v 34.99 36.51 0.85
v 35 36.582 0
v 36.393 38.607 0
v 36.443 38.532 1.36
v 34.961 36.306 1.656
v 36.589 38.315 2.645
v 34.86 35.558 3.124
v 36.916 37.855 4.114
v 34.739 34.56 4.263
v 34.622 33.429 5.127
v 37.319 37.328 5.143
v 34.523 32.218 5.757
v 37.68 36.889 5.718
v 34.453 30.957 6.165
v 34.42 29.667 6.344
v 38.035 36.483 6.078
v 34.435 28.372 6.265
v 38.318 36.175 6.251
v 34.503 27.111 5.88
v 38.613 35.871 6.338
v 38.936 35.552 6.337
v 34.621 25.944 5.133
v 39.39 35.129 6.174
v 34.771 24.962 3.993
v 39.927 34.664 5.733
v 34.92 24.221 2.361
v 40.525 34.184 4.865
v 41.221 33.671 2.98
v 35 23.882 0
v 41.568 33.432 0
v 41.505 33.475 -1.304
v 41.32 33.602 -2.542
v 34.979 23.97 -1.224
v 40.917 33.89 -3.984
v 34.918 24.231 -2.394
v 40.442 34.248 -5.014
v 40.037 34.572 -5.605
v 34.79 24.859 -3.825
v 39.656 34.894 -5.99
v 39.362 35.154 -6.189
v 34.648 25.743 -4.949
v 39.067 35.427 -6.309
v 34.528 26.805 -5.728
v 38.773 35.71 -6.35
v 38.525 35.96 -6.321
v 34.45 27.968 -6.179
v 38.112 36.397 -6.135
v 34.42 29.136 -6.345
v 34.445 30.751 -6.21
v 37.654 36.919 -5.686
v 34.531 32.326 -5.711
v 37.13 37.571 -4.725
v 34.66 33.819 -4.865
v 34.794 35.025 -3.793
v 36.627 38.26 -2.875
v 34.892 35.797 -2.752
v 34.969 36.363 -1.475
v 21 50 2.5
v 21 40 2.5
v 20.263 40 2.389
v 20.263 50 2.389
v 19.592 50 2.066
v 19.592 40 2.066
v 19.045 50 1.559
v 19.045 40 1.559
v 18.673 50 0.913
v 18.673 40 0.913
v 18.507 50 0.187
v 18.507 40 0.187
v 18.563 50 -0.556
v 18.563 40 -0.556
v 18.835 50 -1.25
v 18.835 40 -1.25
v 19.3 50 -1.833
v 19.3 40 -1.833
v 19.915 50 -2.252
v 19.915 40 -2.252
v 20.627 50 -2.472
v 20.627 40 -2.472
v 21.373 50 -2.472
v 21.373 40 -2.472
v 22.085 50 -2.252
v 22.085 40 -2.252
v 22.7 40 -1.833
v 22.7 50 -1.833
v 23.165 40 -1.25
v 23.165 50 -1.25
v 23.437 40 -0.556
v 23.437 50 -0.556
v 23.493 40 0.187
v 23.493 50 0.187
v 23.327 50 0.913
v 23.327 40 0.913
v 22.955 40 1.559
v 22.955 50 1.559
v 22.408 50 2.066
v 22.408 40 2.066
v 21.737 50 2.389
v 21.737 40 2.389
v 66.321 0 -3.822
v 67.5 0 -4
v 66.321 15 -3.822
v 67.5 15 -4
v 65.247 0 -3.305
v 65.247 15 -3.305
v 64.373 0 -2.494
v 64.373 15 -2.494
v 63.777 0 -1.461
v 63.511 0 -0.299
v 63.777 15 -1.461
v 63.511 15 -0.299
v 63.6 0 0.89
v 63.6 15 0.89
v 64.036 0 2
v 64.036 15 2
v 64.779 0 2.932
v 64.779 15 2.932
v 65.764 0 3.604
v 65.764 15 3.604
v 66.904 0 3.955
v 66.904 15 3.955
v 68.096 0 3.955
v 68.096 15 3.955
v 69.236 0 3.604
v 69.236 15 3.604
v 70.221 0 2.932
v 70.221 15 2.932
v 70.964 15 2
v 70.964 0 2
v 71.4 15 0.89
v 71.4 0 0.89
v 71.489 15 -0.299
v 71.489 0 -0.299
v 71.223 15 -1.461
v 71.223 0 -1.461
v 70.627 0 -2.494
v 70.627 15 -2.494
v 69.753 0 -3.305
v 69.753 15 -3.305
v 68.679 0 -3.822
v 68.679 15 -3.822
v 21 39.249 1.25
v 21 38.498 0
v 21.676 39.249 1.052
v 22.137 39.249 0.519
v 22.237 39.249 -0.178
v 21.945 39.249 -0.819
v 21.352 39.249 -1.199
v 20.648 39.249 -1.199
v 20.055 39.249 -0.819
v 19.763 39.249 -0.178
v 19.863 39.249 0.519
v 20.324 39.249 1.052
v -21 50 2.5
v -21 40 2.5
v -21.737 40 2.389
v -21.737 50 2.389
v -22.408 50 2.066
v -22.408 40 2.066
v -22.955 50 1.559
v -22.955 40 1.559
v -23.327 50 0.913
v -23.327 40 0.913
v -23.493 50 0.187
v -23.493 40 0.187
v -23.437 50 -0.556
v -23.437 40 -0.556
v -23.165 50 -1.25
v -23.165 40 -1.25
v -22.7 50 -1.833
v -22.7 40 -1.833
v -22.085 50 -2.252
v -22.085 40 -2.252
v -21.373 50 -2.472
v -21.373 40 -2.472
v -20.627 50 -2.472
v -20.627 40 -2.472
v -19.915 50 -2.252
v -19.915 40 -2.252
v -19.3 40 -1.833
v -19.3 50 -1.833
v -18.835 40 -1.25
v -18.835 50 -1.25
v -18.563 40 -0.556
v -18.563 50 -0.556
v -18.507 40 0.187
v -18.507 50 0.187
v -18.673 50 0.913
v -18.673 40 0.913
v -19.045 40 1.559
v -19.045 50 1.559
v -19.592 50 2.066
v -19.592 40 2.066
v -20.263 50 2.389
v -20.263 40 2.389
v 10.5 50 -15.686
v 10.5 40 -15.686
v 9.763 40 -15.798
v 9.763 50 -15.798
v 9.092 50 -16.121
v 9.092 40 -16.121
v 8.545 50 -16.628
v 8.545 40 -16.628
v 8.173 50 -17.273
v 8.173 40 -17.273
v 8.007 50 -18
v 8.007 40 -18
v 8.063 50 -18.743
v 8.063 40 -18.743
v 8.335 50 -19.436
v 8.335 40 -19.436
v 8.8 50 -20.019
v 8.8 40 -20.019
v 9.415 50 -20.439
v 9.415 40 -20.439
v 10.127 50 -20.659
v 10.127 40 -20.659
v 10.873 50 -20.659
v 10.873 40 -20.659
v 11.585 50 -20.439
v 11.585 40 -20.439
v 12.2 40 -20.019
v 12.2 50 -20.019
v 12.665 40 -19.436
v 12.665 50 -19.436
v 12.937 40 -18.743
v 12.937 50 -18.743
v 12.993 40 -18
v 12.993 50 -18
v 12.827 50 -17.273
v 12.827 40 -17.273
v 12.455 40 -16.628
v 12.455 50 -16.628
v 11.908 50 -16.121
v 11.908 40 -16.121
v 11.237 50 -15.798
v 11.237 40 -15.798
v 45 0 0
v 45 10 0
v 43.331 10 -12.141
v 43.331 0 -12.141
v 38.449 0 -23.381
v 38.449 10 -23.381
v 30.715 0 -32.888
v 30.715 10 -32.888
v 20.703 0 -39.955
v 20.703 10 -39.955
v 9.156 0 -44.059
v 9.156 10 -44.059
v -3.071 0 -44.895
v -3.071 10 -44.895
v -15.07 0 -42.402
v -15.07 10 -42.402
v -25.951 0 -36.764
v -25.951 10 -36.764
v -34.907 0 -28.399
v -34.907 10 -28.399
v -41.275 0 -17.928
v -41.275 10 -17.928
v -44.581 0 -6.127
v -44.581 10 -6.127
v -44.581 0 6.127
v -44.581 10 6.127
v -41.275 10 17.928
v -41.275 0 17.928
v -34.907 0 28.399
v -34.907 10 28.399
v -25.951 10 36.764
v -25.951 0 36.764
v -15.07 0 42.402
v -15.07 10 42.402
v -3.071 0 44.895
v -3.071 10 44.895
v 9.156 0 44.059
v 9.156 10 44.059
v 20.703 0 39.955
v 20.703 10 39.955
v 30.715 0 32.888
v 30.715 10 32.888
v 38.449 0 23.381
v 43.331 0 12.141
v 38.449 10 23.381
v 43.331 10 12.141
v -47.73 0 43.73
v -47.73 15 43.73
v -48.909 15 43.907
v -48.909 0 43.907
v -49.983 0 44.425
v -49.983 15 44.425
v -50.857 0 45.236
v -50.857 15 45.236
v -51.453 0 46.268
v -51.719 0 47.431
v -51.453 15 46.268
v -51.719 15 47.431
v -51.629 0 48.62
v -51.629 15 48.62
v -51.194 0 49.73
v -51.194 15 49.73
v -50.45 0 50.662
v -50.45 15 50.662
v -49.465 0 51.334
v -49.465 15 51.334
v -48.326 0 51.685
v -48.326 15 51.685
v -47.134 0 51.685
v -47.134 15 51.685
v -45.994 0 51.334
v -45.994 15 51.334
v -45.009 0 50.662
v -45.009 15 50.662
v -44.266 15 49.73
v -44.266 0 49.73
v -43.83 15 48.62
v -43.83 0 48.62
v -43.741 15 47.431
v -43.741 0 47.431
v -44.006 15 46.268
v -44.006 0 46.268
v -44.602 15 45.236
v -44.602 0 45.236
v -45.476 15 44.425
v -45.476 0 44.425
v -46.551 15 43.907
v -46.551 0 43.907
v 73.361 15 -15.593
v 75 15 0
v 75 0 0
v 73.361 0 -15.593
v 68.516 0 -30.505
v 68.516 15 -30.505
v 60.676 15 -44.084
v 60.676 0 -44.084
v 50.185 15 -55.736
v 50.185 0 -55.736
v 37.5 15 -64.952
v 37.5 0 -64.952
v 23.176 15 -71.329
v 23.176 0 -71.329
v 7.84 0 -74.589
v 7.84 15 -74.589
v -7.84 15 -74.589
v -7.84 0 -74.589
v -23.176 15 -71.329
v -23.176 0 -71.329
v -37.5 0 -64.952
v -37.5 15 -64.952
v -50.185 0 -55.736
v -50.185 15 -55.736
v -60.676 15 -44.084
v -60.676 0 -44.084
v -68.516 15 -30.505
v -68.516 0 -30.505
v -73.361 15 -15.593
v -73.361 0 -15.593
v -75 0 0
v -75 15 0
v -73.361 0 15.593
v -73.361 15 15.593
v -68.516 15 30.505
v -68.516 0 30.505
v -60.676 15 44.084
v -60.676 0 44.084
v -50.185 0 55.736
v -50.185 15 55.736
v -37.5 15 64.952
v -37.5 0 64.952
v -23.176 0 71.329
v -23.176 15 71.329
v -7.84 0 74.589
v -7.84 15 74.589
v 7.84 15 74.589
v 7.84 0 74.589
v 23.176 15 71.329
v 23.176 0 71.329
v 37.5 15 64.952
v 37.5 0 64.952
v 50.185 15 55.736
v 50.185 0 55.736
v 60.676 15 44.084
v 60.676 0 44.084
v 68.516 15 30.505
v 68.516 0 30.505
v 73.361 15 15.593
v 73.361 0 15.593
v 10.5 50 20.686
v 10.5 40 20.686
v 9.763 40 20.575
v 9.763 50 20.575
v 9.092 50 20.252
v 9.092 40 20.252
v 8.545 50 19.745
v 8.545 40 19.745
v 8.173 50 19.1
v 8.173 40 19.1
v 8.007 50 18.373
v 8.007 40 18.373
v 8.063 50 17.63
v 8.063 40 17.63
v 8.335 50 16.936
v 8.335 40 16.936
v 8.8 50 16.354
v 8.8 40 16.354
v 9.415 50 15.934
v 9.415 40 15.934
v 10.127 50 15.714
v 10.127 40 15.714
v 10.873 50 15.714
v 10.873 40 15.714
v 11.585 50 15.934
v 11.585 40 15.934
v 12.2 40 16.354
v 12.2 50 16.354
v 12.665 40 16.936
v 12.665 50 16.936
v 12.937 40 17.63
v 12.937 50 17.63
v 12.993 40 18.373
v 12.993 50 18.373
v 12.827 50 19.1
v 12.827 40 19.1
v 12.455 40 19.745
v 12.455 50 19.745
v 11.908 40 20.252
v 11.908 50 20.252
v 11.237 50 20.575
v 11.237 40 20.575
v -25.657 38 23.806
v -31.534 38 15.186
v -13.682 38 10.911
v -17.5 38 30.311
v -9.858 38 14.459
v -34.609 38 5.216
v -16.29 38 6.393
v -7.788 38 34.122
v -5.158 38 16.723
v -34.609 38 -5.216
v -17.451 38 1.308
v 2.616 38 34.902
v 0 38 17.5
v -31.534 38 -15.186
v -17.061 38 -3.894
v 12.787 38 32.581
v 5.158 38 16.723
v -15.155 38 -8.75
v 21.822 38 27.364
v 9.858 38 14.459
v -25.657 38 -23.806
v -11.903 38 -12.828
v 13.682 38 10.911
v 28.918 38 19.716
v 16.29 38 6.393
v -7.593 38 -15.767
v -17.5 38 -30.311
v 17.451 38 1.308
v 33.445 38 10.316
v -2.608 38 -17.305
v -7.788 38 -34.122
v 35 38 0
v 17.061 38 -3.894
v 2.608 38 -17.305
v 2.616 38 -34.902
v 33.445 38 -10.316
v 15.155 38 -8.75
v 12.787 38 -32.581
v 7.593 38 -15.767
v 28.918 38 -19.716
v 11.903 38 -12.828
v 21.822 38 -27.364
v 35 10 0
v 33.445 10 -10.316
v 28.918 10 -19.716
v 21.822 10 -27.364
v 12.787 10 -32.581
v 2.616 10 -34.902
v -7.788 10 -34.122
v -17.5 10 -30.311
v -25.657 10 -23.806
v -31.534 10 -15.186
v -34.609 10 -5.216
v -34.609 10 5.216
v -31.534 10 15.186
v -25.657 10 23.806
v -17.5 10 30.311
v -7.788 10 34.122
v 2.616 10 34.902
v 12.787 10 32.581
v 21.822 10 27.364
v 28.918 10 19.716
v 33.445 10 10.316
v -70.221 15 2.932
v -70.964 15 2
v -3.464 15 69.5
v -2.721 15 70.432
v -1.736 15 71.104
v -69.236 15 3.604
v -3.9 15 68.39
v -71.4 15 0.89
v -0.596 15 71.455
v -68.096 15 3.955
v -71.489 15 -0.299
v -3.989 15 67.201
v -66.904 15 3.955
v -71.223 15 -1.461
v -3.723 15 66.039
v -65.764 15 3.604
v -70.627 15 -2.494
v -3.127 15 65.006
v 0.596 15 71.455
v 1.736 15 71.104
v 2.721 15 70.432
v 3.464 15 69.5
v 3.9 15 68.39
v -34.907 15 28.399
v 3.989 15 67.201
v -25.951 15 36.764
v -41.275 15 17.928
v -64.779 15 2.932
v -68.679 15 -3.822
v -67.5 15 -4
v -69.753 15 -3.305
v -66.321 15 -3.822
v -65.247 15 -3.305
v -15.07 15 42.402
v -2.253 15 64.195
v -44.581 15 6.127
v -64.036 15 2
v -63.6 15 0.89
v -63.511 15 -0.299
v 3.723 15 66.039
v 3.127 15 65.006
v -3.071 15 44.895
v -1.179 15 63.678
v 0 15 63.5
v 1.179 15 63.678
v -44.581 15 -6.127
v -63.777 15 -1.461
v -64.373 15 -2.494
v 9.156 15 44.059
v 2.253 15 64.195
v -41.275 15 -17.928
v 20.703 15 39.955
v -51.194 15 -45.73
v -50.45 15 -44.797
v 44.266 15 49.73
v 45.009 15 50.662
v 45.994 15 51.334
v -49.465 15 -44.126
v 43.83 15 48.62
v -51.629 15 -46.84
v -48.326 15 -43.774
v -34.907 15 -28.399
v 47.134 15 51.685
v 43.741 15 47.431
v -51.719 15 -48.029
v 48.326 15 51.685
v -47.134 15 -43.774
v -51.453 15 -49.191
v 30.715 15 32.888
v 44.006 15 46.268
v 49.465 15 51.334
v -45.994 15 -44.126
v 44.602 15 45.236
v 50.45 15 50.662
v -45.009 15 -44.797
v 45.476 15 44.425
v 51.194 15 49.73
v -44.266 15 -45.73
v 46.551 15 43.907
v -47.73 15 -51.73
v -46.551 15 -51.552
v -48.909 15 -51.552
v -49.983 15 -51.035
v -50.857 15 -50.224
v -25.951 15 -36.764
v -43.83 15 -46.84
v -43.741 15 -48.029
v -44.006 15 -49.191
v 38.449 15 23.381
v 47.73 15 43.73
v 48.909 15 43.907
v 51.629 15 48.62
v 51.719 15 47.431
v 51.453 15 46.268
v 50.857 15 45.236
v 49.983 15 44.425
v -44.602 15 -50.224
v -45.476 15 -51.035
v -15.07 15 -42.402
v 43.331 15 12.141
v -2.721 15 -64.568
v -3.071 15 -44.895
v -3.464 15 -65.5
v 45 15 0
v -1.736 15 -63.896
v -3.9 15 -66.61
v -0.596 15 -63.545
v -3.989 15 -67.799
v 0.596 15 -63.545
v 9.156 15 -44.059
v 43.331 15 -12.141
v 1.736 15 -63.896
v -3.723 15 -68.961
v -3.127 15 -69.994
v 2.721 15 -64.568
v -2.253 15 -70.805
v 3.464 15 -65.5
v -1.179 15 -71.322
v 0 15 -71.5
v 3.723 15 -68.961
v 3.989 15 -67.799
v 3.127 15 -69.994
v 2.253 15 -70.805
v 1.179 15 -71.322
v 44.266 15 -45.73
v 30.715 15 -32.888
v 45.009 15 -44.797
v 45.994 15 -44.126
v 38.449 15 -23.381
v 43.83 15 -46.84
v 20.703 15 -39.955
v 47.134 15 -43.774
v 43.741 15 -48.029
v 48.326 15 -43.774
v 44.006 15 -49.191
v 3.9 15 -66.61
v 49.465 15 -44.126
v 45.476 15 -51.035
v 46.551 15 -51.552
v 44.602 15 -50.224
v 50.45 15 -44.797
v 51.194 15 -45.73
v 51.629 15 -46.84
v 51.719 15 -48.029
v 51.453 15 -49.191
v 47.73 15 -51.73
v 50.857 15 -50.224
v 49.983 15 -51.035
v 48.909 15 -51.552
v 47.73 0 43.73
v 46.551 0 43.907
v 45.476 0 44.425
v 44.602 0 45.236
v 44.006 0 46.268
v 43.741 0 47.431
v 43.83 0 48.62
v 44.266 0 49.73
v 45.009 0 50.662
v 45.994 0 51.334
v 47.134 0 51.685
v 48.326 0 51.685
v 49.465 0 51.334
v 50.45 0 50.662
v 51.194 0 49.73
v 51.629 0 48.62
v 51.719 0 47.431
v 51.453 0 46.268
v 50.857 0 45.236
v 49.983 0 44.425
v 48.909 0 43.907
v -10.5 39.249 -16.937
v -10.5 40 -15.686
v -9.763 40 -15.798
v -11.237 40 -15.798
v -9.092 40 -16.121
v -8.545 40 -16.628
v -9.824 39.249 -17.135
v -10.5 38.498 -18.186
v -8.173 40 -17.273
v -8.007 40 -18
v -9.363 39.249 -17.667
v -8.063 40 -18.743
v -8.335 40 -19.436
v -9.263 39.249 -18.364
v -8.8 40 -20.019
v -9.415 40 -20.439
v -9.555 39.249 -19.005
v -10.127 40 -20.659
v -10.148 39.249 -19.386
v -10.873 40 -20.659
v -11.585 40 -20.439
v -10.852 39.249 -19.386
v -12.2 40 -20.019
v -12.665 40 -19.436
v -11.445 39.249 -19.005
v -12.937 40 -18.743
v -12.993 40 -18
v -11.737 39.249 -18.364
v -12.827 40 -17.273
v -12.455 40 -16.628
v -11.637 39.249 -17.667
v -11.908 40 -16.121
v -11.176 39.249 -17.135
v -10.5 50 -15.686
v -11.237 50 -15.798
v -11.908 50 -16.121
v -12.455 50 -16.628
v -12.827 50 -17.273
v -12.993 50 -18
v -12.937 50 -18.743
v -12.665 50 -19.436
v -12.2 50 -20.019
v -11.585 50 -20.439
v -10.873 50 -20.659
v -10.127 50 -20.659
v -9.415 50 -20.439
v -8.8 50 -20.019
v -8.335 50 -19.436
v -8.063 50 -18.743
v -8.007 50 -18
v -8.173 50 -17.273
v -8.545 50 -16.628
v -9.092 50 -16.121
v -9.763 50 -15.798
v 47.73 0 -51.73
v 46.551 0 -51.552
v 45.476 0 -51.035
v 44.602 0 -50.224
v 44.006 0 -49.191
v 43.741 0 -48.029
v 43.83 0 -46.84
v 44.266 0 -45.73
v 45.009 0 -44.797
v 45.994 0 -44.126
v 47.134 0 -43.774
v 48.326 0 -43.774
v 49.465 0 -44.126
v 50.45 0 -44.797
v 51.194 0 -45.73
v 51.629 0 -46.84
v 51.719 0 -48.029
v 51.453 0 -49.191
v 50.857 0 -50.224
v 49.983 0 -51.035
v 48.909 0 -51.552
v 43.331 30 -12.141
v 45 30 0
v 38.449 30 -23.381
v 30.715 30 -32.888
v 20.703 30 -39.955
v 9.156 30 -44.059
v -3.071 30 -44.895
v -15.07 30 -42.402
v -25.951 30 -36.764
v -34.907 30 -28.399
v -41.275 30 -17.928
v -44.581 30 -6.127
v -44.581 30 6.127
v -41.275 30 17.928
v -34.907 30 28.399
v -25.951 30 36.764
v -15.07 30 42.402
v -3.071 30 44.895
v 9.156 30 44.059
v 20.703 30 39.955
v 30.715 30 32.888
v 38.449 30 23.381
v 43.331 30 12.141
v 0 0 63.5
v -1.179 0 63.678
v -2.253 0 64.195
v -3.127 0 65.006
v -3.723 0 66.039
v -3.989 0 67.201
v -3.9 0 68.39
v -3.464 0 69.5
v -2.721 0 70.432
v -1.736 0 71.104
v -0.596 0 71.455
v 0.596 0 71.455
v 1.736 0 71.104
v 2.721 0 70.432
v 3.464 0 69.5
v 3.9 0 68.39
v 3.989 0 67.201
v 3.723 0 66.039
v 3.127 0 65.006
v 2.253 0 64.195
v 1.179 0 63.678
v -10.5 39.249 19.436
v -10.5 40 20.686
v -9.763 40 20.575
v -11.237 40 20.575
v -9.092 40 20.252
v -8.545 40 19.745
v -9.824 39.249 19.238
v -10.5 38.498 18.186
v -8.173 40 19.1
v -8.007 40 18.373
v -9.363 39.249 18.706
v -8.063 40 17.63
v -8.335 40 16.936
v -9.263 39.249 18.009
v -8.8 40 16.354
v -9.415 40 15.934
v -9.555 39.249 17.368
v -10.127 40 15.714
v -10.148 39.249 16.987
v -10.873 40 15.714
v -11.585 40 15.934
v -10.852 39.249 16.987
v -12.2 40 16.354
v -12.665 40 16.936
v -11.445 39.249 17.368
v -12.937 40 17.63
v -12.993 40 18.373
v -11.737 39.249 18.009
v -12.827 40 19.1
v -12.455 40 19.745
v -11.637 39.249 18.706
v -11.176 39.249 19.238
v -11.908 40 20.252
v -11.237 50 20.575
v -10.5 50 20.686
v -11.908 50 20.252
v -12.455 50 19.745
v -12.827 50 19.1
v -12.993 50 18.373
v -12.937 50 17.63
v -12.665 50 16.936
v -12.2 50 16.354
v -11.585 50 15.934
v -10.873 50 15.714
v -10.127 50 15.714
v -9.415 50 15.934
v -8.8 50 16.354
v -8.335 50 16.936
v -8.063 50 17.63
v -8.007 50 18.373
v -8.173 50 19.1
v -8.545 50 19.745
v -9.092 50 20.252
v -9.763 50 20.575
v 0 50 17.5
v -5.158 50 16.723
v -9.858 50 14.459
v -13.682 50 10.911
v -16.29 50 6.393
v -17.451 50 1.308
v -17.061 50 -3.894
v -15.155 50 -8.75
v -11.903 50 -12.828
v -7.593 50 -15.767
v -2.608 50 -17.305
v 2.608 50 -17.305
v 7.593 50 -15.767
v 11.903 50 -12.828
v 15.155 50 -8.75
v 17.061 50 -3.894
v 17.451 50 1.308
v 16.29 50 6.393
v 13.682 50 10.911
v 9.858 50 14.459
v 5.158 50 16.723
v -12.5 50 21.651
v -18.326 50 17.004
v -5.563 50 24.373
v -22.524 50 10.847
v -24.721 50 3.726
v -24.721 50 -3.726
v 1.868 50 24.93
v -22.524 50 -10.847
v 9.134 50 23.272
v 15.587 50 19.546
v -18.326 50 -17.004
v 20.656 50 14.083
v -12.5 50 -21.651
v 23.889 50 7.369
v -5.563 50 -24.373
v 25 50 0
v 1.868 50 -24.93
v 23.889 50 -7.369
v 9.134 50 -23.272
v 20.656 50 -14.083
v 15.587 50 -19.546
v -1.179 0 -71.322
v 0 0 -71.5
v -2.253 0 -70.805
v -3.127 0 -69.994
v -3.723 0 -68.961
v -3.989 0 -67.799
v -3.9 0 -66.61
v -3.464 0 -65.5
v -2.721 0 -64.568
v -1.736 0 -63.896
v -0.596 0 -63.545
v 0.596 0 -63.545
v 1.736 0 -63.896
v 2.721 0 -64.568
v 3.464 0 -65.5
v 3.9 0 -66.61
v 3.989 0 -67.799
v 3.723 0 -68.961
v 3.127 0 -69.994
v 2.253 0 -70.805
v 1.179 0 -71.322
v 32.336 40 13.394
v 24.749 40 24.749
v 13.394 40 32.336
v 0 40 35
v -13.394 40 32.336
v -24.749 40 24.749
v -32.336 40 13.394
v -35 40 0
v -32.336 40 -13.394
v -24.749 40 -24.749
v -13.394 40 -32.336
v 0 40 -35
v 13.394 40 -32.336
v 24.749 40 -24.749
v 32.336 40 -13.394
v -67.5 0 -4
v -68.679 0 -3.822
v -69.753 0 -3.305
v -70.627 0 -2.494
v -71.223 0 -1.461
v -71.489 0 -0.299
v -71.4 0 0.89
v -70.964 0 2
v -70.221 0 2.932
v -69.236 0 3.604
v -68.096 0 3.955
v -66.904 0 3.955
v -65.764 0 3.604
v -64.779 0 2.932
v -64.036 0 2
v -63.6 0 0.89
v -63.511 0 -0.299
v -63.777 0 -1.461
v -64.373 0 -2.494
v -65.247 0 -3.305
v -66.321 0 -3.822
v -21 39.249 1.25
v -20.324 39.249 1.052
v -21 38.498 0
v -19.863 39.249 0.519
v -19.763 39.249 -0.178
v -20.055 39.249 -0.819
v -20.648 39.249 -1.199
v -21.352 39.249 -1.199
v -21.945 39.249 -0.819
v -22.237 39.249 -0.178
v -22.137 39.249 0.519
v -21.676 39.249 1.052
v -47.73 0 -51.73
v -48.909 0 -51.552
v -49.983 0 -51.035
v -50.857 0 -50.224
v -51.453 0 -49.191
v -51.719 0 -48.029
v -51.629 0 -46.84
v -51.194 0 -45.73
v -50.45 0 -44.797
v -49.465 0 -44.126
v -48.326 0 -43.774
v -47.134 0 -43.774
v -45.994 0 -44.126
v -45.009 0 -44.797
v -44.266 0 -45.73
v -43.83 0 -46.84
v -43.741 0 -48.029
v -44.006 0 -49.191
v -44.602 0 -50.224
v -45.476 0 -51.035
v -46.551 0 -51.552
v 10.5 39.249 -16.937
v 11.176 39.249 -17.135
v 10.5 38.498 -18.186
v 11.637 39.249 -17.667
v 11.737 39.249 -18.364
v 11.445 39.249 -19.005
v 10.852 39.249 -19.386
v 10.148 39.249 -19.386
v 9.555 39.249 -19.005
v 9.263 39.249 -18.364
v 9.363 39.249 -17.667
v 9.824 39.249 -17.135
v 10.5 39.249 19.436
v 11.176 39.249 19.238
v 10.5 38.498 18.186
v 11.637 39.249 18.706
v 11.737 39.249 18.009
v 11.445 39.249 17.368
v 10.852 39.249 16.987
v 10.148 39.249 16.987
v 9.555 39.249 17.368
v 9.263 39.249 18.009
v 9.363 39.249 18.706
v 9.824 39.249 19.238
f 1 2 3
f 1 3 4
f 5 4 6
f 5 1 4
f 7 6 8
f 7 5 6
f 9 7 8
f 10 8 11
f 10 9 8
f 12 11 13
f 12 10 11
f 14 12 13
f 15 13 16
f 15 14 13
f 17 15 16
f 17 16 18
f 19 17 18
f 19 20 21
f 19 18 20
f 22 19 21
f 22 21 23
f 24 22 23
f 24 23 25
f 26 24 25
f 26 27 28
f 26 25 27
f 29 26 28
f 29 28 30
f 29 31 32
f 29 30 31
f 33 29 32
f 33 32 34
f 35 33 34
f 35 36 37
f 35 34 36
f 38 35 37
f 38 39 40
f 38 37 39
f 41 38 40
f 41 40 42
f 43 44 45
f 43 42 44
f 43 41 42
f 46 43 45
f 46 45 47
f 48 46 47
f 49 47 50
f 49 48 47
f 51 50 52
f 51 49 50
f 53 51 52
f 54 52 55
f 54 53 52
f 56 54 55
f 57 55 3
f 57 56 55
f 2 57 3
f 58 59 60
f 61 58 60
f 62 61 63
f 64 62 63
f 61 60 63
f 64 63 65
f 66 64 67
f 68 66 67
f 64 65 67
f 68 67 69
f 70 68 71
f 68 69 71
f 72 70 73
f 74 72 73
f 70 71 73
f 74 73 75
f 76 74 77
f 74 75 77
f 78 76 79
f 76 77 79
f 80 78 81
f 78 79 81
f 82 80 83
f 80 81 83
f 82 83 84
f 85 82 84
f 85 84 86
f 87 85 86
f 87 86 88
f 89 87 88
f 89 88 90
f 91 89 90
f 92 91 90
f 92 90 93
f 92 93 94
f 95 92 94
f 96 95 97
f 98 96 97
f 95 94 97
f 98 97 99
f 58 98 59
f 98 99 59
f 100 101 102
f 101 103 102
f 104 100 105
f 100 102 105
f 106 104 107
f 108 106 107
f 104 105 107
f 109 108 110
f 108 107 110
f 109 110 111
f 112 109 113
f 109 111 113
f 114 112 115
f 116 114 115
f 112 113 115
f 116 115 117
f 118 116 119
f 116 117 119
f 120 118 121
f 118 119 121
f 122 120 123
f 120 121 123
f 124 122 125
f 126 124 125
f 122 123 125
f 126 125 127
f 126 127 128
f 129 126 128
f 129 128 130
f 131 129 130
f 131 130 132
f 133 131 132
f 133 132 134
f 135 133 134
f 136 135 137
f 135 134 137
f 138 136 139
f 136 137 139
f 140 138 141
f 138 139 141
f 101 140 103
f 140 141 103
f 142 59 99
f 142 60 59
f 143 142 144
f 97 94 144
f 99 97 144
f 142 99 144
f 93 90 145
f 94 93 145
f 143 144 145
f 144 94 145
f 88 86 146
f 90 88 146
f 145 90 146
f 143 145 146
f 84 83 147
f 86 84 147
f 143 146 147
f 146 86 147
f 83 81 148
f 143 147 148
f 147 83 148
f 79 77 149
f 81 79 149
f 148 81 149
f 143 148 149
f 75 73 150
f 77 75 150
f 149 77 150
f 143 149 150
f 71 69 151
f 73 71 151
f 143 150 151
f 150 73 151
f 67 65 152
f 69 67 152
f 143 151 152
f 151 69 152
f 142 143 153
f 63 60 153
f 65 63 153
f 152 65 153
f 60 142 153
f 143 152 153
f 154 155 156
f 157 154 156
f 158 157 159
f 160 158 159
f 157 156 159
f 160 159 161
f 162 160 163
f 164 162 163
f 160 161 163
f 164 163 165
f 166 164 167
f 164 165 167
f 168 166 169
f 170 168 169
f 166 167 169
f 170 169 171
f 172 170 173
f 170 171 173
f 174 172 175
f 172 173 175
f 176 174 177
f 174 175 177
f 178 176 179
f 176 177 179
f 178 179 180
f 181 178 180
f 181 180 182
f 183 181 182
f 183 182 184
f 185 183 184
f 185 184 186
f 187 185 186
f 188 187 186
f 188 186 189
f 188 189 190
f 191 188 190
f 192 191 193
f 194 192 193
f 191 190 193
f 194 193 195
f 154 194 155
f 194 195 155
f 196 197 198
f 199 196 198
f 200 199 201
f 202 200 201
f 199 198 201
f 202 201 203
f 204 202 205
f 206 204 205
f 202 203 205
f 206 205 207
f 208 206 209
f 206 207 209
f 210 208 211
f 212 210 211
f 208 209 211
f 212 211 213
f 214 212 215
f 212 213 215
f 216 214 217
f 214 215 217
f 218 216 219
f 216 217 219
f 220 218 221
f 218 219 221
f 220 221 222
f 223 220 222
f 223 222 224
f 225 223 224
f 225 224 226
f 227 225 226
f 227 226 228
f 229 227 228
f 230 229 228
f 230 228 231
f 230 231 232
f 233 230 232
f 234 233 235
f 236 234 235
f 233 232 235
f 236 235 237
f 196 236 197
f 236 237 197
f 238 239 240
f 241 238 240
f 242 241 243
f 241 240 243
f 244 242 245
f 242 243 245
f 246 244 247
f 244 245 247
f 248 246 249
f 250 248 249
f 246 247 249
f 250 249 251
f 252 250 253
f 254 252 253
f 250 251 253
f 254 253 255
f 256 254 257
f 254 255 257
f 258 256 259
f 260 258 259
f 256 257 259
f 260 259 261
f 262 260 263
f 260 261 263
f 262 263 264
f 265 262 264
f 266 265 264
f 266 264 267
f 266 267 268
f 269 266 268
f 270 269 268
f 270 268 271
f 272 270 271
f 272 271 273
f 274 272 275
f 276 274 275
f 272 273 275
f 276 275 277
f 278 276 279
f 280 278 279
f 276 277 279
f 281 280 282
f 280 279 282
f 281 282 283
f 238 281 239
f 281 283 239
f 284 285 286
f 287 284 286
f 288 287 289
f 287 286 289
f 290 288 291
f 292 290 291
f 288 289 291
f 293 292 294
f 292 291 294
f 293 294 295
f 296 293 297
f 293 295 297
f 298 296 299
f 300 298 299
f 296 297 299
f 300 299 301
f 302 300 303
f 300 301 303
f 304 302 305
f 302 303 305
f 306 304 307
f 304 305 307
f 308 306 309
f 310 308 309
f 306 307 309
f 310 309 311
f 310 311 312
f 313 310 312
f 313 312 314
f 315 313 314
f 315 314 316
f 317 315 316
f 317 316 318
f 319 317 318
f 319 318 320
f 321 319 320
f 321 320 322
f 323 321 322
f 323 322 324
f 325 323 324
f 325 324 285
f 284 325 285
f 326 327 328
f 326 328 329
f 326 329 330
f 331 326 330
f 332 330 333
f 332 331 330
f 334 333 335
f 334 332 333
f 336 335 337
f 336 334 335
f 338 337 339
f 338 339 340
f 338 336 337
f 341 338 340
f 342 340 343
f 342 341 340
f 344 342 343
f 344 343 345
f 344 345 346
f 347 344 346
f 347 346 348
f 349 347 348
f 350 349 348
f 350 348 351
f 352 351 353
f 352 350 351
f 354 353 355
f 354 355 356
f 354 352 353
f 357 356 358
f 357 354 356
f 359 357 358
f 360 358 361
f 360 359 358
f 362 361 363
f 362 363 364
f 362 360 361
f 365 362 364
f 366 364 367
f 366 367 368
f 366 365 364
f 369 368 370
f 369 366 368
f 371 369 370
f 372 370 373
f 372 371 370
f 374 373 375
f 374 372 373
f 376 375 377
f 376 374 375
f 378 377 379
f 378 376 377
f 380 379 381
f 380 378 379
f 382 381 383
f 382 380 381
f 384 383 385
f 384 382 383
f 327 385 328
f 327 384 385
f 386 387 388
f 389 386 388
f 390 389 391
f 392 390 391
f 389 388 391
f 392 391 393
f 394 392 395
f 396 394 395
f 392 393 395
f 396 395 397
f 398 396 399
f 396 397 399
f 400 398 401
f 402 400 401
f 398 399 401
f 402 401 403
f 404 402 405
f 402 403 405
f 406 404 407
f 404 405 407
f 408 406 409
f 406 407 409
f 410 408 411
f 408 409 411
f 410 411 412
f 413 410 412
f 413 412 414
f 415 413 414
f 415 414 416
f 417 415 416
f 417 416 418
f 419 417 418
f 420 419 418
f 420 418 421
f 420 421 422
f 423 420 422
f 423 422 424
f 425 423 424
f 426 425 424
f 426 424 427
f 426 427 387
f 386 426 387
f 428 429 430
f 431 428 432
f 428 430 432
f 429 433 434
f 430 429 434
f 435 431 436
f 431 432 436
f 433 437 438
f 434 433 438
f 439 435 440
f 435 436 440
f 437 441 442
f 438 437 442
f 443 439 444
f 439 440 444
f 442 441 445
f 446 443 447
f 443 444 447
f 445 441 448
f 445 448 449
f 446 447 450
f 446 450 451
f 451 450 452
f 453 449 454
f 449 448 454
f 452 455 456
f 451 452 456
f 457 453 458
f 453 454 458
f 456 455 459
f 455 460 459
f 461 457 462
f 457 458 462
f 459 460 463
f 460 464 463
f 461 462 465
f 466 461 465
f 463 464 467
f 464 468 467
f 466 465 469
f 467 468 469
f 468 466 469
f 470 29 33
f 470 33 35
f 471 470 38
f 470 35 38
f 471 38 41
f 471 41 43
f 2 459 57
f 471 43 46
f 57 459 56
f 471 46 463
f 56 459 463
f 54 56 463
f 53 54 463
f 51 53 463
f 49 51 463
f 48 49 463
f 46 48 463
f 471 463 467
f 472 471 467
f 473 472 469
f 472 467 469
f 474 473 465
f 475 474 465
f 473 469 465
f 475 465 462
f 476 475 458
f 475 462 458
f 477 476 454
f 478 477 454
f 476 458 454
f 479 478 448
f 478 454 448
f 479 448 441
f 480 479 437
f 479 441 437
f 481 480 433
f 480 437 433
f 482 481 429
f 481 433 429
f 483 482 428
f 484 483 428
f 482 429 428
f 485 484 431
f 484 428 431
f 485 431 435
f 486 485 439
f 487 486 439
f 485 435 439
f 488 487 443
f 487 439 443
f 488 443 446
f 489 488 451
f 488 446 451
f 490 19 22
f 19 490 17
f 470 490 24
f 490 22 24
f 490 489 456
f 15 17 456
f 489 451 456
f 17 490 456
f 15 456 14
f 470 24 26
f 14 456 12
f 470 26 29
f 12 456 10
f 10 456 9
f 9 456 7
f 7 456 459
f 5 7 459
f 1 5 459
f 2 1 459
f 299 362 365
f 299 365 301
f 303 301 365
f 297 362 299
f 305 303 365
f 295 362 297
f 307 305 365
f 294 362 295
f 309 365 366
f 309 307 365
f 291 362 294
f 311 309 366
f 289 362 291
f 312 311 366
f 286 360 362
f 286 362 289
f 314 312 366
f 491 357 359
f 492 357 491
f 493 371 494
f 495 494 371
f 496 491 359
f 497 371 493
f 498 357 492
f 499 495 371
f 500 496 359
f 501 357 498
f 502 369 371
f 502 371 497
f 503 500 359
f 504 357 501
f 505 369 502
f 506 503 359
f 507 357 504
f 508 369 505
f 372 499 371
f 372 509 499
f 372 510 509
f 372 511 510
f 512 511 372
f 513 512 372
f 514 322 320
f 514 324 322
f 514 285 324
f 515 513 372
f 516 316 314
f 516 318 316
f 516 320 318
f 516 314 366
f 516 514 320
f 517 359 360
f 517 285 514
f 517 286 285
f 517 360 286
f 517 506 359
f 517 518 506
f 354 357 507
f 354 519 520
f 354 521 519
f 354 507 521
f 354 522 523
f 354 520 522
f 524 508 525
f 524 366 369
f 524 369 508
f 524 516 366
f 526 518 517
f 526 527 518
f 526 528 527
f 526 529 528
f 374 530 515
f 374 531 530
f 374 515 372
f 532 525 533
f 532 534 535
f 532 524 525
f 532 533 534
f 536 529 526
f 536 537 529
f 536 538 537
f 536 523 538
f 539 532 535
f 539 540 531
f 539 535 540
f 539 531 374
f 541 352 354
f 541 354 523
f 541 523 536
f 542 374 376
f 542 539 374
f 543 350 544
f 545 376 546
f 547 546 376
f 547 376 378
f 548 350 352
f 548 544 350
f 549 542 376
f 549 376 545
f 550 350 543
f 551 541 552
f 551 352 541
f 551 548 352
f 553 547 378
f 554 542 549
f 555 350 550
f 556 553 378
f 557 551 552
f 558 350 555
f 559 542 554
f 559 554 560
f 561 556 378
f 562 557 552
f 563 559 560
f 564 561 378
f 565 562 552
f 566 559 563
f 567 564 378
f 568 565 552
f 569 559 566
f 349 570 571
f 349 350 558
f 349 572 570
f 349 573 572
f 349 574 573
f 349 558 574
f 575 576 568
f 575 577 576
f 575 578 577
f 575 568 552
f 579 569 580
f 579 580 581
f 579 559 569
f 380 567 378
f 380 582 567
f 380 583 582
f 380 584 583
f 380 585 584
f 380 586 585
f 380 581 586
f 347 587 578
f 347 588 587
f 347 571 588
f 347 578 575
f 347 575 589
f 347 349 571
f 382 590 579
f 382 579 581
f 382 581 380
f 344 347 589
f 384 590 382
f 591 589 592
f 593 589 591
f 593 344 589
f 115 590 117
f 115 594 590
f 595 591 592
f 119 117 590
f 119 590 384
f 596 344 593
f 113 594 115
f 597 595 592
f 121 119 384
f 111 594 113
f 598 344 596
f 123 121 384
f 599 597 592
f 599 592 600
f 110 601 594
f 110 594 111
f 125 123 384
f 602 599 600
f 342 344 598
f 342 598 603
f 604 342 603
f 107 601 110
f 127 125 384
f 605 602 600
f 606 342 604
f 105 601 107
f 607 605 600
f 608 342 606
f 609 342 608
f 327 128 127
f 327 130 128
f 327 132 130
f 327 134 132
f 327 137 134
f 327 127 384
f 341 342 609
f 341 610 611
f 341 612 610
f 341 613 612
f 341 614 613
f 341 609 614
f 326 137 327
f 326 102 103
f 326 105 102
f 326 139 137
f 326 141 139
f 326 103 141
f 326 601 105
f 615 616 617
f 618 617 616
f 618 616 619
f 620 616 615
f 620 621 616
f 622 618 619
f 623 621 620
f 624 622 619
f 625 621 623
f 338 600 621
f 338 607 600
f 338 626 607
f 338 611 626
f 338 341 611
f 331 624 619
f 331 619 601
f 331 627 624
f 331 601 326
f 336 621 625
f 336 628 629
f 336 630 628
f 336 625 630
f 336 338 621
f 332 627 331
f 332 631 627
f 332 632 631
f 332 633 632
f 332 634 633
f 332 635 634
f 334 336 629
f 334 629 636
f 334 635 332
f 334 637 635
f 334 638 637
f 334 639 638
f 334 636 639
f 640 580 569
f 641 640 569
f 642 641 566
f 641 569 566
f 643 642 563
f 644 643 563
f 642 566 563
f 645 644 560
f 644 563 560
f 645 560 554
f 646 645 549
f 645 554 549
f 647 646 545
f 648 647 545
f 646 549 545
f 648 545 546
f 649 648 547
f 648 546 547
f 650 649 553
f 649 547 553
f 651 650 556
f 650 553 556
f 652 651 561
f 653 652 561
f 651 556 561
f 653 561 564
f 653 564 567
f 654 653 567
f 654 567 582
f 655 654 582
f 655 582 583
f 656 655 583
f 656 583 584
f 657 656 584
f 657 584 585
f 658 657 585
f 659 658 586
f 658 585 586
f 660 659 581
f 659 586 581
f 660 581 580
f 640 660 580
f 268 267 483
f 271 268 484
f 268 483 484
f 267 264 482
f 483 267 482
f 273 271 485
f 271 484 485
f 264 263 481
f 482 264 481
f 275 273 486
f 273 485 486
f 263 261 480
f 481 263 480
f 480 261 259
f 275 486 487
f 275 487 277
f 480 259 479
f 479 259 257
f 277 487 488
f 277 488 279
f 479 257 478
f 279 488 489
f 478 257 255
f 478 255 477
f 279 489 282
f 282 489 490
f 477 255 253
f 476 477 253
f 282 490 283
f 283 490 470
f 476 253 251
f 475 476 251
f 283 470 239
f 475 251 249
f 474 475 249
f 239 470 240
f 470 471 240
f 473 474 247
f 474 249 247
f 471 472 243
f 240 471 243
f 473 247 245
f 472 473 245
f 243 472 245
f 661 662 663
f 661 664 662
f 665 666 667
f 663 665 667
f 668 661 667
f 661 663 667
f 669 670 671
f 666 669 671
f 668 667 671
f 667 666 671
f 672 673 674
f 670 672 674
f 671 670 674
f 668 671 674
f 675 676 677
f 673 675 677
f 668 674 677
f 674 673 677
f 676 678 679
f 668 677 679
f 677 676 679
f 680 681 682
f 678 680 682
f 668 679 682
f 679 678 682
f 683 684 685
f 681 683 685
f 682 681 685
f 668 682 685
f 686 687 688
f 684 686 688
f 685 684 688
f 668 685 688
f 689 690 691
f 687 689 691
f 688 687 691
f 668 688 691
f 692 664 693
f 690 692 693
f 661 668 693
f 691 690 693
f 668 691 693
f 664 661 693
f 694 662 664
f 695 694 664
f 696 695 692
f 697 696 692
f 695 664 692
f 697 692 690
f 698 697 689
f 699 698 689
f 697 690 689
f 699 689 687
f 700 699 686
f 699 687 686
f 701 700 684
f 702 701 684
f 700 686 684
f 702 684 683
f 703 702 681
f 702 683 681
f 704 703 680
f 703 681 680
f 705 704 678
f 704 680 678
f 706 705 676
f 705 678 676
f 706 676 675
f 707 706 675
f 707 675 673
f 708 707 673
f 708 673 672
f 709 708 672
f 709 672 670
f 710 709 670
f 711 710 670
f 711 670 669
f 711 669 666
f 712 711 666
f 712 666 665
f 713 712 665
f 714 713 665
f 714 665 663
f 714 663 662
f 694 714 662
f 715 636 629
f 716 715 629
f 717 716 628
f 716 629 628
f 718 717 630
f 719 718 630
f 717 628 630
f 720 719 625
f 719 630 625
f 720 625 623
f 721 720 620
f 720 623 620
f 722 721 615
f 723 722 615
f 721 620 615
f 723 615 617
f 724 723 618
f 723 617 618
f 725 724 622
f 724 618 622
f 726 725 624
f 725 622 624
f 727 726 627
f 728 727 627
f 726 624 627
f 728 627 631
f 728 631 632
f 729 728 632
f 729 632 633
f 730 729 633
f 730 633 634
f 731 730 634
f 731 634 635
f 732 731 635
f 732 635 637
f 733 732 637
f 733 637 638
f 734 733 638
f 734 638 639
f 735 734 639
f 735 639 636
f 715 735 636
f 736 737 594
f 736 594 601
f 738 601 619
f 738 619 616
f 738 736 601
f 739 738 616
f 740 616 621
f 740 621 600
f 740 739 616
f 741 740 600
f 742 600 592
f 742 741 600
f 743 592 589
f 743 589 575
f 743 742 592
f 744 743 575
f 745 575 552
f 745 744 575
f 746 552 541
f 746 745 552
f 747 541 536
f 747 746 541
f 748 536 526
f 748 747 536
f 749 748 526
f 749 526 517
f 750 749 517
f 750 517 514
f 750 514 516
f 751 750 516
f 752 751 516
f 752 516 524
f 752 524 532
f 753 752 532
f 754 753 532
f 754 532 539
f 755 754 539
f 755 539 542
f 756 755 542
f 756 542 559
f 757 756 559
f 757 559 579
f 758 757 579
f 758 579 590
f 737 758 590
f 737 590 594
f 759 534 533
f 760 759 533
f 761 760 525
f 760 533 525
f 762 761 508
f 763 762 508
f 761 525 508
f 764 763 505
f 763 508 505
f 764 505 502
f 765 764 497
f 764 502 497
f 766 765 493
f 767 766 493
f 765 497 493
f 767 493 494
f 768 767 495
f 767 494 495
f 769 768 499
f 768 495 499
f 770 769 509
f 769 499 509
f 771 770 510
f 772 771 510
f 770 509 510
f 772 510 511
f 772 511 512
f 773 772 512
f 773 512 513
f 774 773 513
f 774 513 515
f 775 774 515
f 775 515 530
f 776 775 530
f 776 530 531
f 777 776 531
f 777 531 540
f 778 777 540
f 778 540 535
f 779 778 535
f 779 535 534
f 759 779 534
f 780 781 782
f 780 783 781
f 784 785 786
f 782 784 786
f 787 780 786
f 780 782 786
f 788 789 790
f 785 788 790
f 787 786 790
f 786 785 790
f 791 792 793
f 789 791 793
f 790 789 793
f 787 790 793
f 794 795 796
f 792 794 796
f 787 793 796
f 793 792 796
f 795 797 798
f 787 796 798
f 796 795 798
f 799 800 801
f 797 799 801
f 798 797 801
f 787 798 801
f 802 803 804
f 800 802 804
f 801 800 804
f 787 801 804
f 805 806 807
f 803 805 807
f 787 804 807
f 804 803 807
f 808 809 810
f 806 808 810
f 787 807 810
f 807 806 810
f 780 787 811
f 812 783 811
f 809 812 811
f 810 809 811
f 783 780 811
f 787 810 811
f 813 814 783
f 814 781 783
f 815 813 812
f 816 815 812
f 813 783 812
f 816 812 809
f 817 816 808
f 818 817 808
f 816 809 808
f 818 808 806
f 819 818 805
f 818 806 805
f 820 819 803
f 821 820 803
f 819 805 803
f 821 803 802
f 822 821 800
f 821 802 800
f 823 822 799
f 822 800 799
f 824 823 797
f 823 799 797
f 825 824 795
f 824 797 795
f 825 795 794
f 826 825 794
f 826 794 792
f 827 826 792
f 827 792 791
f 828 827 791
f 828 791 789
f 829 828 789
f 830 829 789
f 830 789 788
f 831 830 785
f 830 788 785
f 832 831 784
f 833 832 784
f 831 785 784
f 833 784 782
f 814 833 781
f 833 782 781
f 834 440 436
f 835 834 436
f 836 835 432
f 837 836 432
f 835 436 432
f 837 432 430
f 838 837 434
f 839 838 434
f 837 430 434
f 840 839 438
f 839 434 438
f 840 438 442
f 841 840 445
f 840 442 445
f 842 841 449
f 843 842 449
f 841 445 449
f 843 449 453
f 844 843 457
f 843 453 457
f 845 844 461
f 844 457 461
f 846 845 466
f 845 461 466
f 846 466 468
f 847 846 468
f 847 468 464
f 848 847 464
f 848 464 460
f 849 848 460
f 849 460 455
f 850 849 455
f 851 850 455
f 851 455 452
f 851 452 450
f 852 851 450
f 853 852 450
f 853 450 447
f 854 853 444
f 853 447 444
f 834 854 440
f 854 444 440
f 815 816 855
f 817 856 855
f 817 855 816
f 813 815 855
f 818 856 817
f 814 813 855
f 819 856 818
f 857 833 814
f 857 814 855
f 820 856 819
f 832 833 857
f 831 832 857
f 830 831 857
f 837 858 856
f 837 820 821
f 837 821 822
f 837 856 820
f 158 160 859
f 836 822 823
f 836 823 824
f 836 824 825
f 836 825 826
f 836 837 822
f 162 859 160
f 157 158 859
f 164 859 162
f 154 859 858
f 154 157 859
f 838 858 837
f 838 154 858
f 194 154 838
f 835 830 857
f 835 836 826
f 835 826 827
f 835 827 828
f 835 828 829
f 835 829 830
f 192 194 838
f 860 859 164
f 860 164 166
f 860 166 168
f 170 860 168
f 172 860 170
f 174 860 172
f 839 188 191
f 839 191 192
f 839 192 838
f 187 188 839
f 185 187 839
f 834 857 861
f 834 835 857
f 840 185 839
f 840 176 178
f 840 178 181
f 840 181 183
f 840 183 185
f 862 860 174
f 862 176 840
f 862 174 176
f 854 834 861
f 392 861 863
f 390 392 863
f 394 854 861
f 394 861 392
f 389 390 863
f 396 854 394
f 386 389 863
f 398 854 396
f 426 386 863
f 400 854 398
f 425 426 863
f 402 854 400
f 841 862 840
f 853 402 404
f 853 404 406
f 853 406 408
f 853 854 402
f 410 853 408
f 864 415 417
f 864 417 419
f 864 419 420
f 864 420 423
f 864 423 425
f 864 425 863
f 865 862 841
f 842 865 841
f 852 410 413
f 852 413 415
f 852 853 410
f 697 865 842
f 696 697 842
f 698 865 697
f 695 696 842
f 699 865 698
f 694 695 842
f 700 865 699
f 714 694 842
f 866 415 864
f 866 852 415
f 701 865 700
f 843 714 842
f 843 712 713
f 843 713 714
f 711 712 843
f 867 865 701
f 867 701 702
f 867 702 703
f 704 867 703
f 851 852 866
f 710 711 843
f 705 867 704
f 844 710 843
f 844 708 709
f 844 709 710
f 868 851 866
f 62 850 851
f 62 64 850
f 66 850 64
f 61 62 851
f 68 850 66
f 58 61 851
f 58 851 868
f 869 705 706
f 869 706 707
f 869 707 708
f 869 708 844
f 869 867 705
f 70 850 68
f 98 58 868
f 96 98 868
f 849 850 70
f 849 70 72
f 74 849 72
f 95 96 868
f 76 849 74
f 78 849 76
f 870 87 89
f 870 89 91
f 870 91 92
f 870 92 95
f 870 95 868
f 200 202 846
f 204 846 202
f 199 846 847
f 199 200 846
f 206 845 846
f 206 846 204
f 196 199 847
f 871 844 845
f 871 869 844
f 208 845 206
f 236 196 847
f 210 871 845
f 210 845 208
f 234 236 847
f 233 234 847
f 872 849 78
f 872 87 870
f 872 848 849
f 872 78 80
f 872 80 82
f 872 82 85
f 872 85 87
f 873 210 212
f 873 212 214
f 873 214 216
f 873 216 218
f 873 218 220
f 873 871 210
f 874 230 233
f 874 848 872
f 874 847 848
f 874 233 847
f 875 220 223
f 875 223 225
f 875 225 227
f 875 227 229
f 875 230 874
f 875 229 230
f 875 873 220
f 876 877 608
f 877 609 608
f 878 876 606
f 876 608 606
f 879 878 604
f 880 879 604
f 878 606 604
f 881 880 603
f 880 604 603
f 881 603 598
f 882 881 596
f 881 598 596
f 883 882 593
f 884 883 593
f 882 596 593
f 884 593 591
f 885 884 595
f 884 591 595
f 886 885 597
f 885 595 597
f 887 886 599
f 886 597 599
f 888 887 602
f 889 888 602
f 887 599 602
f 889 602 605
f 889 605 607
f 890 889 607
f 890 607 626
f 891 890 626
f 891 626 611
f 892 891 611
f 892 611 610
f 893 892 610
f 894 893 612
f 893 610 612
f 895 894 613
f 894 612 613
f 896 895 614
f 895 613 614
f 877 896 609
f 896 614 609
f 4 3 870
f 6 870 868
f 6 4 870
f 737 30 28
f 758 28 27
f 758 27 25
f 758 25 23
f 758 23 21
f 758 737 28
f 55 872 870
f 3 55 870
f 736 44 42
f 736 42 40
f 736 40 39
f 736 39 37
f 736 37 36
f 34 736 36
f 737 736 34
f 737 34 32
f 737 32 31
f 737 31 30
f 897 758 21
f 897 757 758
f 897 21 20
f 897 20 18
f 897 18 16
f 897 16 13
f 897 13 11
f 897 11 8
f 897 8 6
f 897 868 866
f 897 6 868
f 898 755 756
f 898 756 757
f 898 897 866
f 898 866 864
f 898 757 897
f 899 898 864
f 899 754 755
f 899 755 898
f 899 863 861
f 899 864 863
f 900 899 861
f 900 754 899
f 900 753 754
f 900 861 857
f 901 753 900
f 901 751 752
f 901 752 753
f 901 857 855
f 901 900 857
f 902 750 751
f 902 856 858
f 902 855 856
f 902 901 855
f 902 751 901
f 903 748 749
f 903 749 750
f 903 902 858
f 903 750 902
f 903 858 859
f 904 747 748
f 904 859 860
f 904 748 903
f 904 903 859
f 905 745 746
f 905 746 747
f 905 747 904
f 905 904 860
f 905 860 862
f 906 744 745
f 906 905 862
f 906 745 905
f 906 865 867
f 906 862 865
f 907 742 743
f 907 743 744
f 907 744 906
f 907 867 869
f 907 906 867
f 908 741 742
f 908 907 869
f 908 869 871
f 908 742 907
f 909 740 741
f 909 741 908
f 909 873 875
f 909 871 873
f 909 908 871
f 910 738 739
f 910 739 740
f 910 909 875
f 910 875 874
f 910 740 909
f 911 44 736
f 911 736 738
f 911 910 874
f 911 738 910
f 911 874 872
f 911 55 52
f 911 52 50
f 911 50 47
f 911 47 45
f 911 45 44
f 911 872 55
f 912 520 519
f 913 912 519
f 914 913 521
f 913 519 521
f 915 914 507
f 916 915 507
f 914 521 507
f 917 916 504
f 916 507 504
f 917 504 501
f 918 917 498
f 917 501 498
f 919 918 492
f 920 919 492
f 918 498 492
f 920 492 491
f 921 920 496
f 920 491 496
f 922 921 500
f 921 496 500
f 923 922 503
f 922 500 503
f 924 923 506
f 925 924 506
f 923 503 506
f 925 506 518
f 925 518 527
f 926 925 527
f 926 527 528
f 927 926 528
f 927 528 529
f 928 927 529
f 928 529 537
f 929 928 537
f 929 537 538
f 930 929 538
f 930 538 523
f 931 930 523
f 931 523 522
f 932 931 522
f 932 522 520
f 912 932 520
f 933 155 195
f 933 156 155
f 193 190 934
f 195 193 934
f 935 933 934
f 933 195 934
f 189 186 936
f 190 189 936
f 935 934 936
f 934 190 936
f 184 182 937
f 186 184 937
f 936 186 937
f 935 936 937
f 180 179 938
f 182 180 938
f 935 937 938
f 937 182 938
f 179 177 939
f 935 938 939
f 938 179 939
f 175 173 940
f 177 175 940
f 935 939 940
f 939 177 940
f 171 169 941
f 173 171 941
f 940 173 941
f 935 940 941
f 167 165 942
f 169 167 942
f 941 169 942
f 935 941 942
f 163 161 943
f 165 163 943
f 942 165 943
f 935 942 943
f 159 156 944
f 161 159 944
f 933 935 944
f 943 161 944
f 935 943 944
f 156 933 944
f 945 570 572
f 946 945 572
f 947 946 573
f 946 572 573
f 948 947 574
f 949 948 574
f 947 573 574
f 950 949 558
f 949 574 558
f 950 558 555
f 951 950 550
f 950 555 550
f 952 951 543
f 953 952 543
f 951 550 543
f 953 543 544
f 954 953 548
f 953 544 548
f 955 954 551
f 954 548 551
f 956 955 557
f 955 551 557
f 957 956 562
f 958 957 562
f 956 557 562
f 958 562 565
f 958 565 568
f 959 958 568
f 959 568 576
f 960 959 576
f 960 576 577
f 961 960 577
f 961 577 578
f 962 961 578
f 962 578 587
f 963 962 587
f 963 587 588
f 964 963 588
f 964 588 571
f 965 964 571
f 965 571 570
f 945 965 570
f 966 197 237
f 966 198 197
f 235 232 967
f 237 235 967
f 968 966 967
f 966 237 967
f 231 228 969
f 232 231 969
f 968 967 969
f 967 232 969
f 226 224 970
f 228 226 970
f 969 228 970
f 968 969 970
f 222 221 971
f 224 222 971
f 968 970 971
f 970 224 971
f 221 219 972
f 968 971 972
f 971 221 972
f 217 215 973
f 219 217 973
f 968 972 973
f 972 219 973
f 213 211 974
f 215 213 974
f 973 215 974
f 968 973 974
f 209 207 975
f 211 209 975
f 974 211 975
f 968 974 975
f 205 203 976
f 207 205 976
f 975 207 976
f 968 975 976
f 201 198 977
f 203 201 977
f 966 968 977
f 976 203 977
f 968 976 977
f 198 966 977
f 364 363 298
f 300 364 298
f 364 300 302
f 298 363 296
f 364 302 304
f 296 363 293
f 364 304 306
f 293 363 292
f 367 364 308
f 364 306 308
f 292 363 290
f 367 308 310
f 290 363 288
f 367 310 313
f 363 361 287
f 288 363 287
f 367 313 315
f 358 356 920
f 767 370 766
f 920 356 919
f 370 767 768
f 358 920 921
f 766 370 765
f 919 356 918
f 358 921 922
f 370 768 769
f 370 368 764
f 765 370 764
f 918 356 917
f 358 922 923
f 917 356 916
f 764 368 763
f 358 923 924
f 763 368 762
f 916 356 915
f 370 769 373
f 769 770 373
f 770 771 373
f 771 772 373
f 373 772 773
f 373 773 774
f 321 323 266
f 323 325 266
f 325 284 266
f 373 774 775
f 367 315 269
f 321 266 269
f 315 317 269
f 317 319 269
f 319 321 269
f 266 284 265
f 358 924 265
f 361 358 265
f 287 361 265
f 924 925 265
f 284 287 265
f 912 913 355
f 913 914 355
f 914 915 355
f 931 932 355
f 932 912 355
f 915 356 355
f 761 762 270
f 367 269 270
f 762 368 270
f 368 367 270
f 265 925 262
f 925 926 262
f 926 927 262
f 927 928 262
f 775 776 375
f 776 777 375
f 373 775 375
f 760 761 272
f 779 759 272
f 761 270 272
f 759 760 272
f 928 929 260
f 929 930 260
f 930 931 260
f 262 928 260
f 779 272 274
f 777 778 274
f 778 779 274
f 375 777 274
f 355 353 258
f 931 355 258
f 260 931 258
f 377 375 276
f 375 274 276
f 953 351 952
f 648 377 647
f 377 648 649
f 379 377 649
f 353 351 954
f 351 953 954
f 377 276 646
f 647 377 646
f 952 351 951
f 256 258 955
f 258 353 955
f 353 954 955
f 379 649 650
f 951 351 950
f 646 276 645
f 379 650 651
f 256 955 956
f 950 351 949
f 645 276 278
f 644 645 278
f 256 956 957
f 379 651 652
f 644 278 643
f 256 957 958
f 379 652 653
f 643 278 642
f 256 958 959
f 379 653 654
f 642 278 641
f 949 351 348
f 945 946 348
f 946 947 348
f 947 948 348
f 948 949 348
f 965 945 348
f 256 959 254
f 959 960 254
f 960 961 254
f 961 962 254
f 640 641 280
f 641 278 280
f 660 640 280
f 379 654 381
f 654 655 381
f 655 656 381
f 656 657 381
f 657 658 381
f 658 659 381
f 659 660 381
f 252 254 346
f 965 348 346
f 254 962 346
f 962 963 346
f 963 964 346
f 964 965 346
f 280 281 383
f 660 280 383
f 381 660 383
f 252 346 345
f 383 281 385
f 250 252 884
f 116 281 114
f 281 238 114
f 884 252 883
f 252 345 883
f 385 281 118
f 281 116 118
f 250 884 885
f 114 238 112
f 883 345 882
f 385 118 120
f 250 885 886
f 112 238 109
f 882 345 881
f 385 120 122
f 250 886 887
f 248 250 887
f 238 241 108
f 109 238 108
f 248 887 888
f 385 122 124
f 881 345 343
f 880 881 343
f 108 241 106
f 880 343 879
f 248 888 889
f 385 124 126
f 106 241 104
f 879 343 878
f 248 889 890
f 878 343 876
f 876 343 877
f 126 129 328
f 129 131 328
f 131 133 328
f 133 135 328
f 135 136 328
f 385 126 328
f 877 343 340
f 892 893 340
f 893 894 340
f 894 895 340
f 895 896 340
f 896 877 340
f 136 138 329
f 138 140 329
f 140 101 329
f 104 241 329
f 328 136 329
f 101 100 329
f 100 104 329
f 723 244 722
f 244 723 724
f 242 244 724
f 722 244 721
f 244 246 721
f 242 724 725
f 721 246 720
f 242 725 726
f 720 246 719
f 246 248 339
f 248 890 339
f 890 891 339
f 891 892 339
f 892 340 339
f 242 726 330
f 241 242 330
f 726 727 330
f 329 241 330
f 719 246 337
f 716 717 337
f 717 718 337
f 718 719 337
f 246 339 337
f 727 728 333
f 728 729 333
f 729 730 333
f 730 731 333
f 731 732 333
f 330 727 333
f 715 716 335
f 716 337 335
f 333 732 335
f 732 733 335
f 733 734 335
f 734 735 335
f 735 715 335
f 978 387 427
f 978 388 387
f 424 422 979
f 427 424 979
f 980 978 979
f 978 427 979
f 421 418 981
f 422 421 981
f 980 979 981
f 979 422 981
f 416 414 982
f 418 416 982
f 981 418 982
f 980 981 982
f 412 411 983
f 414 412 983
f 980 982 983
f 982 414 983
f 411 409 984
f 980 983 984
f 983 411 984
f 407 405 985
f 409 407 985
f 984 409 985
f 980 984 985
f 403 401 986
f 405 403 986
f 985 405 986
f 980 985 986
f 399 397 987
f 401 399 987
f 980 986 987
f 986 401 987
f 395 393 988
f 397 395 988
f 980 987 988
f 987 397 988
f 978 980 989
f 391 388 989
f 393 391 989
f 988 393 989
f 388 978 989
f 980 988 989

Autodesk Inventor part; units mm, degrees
ref_plane "XZ Plane" through (0, 0, 0) normal (0, 1, 0) x (-1, 0, 0)
ref_plane "XY Plane" through (0, 0, 0) normal (0, 0, 1) x (1, 0, 0)
sketch "Sketch1" plane through (0, 0, 0) normal (0, 0, 1) x (1, 0, 0)
  line L0 (0, 0) -> (0, 50)
  line L1 (45, 0) -> (75, 0)
  line L2 (75, 0) -> (75, 15)
  line L3 (75, 15) -> (45, 15)
  line L4 (45, 15) -> (45, 50)
  line L5 (45, 50) -> (0, 50)
  line L6 (0, 50) -> (0, 38)
  line L7 (45, 0) -> (45, 10)
  line L8 (45, 10) -> (35, 10)
  line L9 (35, 10) -> (35, 38)
  line L10 (35, 38) -> (0, 38)
  line L11 (0, 0) -> (35, 0)
  line L12 (45, 0) -> (45, 0)
  dimension "d1" = 50
  dimension "d2" = 15
  dimension "d4" = 12
  dimension "d5" = 10
  dimension "d6" = 150
  dimension "d7" = 90
  dimension "d8" = 70
  dimension "d9" = 10
revolve "Revolution1" add sketch "Sketch1" angle 360 about axis through (0, 0, 0) along (0, 1, 0)
chamfer "Chamfer1" distance 20 angle 45 1 edges at (-45, 50, 0)
ref_plane "Work Plane1" through (45, 0, 0) normal (1, 0, 0) x (0, 1, 0)
sketch "Sketch4" plane through (45, 0, 0) normal (1, 0, 0) x (0, 1, 0)
  circle A0 centre (44.772, 0) radius 6.35
  point P0 (0, 0)
  dimension "d22" = 12.7
sketch "Sketch5" plane through (0, 0, 0) normal (0, 0, 1) x (1, 0, 0)
  line L0 (44.9751, 46.9317) -> (33.3301, 30)
  line L1 (45, 30) -> (-45, 30) projected
  point P0 (0, 0)
sweep "Sweep3" cut profiles "Sketch4" path "Sketch5" path curves L0
sketch "Sketch6" plane through (0, 50, 0) normal (0, 1, 0) x (1, 0, 0)
  circle A0 centre (0, 0) radius 17.5
  dimension "d25" = 35
hole "Hole1" at (0, 50, 0) direction (0, -1, 0) diameter 35 depth 15 tip angle 118
sketch "Sketch7" plane through (0, 50, 0) normal (0, 1, 0) x (1, 0, 0)
  circle A0 centre (-21, 0) radius 2.75
  circle A1 centre (-10.5, -18.1865) radius 2.75
  circle A2 centre (10.5, -18.1865) radius 2.75
  circle A3 centre (21, 0) radius 2.75
  circle A4 centre (10.5, 18.1865) radius 2.75
  circle A5 centre (-10.5, 18.1865) radius 2.75
  point P0 (0, 0)
  dimension "d34" = 5.5
  dimension "d37" = 360
  dimension "d58" = 21
hole "Hole2" at (-10.5, 50, -18.1865) at (10.5, 50, -18.1865) at (21, 50, 0) at (10.5, 50, 18.1865) at (-10.5, 50, 18.1865) at (-21, 50, 0) direction (0, -1, 0) diameter 5 depth 10 tip angle 118
thread "Thread1"
thread "Thread2"
thread "Thread3"
thread "Thread4"
thread "Thread5"
thread "Thread6"
sketch "Sketch8" plane through (0, 15, 0) normal (0, 1, 0) x (1, 0, 0)
  point P0 (0, 0)
sketch "Sketch9" plane through (0, 0, 0) normal (0, -1, 0) x (1, 0, 0)
  point P0 (0, 0)
sketch "Sketch10" plane through (0, 0, 0) normal (0, -1, 0) x (1, 0, 0)
  point P0 (0, 0)
sketch "Sketch11" plane through (0, 0, 0) normal (0, -1, 0) x (1, 0, 0)
  circle A0 centre (0, 0) radius 17.5 projected
  circle A1 centre (0, 0) radius 67.5 construction
  circle A2 centre (67.5, 0) radius 4
  circle A3 centre (47.7297, -47.7297) radius 4
  circle A4 centre (0, -67.5) radius 4
  circle A5 centre (-47.7297, -47.7297) radius 4
  circle A6 centre (-67.5, 0) radius 4
  circle A7 centre (-47.7297, 47.7297) radius 4
  circle A8 centre (0, 67.5) radius 4
  circle A9 centre (47.7297, 47.7297) radius 4
  dimension "d59" = 135
  dimension "d60" = 8
  dimension "d94" = 360
hole "Hole3" at (67.5, 0, 0) direction (0, 1, 0) diameter 8 end through all
hole "Hole4" at (47.7297, 0, 47.7297) at (0, 0, 67.5) at (-47.7297, 0, 47.7297) at (-67.5, 0, 0) at (-47.7297, 0, -47.7297) at (0, 0, -67.5) at (47.7297, 0, -47.7297) direction (0, 1, 0) diameter 8 end through all
properties part number "final injector body" material "Stainless Steel"
